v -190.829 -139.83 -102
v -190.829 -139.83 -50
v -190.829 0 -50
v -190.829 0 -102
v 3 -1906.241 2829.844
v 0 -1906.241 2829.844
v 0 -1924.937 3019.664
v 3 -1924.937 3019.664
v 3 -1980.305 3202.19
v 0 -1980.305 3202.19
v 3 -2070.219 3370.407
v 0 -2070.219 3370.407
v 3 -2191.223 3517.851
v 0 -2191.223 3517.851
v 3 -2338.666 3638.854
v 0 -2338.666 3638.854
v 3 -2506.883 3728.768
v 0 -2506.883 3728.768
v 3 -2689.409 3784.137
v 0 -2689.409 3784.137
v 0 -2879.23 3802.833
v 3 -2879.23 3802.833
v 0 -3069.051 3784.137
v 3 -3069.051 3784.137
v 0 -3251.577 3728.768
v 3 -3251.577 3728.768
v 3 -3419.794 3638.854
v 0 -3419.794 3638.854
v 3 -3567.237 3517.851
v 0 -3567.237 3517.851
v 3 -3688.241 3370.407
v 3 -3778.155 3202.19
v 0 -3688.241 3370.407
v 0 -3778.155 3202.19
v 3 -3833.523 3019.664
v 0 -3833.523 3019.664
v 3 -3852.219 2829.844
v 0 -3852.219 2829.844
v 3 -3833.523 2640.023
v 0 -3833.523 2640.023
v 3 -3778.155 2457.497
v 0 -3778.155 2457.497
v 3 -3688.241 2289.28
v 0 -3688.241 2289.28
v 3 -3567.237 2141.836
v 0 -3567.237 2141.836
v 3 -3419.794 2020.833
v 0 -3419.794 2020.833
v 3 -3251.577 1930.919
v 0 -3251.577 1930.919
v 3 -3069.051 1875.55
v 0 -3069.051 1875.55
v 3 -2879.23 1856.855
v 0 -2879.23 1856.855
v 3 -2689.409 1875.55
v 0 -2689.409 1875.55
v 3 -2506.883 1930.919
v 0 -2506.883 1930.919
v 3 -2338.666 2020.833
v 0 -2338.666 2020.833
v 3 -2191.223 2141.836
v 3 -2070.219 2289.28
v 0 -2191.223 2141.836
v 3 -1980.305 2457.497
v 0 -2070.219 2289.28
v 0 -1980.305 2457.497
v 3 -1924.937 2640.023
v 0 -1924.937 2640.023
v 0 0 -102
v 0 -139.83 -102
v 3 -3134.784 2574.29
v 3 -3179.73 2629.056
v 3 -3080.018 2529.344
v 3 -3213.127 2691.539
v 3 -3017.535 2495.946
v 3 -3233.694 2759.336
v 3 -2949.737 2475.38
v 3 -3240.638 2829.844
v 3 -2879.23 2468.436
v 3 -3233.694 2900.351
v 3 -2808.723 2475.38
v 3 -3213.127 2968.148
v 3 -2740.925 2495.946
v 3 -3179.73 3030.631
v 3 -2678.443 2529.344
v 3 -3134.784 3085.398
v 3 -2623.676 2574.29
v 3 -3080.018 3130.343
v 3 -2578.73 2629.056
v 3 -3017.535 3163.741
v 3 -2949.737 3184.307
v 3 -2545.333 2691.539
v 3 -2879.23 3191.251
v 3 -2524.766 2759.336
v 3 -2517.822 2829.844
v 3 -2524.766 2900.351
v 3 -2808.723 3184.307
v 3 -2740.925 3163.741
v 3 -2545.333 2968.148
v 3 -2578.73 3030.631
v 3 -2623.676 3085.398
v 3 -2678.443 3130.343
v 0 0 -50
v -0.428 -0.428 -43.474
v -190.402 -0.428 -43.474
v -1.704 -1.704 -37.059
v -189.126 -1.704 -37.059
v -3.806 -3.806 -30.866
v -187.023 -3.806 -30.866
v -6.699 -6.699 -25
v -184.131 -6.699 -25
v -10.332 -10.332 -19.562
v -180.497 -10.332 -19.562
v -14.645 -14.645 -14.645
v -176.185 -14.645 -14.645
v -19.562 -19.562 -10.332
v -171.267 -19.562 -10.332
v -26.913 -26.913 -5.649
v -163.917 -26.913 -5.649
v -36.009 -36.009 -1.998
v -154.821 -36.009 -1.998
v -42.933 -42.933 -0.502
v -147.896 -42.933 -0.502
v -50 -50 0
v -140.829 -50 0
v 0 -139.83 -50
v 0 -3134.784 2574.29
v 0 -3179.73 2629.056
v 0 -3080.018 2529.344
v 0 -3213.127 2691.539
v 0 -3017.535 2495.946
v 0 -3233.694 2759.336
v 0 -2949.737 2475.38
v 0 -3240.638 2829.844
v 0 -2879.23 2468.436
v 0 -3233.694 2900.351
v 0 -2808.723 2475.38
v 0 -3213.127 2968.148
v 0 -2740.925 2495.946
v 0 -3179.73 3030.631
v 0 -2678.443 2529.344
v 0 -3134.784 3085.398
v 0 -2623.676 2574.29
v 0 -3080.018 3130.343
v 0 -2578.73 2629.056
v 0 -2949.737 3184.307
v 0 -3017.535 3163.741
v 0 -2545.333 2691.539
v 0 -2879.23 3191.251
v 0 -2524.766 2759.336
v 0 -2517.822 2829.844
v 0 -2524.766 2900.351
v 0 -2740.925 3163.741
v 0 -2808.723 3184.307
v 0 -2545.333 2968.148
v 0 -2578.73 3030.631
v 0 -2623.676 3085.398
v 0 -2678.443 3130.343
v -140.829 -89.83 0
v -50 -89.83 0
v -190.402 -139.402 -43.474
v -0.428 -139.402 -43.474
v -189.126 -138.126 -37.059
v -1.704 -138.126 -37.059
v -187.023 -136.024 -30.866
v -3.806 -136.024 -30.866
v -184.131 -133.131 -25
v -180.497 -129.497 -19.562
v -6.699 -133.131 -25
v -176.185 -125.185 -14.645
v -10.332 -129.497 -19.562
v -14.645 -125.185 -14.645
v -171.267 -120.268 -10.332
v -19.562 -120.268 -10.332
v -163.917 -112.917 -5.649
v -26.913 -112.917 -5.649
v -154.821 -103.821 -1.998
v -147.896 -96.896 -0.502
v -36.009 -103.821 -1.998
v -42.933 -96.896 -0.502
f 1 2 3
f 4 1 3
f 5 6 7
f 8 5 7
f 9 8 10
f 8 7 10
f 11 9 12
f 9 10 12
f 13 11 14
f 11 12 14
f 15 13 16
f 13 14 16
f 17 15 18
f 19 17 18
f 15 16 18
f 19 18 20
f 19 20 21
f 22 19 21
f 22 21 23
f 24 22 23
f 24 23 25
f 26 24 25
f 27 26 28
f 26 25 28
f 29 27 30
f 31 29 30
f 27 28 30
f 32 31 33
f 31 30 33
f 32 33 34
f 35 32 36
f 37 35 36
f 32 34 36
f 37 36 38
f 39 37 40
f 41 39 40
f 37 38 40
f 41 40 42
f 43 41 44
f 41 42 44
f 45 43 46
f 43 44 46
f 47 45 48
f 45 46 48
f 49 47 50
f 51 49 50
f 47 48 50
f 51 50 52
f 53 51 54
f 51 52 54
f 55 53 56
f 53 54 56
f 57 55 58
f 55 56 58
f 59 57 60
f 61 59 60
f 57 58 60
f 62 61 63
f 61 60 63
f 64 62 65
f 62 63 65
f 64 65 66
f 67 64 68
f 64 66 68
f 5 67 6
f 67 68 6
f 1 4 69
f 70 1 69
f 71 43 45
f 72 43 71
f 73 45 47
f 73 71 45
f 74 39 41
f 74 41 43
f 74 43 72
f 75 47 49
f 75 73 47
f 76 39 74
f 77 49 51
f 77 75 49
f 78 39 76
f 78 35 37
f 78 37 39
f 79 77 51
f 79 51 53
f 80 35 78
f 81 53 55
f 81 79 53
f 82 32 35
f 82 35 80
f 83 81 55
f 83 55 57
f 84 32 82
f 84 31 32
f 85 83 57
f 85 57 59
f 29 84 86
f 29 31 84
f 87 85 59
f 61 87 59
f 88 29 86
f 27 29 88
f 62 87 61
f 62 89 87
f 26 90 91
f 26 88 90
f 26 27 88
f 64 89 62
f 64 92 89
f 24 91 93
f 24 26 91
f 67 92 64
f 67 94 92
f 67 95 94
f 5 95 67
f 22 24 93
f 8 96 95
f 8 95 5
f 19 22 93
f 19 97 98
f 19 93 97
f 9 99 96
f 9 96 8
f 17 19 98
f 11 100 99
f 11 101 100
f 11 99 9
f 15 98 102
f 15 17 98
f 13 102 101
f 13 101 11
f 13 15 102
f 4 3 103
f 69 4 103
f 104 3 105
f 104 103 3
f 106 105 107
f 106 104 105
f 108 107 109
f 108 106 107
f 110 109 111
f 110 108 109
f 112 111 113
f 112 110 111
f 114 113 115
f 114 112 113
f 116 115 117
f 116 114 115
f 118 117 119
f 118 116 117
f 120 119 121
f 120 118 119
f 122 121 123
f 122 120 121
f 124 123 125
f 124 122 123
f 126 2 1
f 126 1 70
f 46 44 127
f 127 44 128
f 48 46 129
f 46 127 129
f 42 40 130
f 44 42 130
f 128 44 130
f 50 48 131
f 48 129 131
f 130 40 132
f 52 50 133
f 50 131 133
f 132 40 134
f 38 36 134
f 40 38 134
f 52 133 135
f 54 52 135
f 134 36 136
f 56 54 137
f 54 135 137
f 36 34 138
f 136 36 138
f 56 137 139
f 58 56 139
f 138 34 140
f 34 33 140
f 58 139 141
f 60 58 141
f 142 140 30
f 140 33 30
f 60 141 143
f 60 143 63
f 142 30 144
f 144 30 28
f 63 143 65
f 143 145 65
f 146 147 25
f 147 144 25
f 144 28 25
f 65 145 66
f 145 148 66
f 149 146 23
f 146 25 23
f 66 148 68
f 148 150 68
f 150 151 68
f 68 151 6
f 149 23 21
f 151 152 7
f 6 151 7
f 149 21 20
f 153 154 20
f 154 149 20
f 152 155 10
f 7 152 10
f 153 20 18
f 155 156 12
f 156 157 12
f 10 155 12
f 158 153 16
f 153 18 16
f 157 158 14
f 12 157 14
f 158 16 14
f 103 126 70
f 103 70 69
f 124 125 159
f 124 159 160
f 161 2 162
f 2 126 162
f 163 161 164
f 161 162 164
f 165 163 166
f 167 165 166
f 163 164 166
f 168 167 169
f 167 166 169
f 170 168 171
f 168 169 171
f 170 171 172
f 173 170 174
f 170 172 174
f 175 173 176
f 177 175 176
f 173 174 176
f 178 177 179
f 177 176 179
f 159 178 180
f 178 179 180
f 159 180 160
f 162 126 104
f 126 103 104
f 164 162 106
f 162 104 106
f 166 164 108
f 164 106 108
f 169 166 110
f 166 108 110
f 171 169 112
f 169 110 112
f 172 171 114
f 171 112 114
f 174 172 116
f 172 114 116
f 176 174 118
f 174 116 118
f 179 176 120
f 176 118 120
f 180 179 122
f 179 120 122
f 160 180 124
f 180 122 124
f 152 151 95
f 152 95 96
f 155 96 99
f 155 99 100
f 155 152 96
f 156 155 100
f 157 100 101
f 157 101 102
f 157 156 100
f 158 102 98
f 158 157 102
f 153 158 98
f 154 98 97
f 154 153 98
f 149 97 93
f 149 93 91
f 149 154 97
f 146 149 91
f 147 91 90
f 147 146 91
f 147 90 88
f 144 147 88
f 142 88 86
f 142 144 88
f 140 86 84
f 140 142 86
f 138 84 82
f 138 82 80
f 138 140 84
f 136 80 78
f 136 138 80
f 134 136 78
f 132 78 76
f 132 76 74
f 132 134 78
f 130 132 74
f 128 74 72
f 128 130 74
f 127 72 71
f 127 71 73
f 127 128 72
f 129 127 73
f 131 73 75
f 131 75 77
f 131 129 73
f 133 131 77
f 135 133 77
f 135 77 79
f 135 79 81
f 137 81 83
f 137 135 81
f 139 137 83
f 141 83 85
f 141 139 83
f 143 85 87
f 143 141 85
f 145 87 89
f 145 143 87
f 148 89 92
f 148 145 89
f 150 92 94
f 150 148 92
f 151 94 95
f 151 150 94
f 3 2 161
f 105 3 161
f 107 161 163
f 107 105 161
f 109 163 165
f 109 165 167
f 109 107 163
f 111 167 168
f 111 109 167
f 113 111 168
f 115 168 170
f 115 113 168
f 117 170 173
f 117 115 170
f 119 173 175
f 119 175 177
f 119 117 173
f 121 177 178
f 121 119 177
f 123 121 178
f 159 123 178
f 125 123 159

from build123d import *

# Parameters (mm, degrees)
F0_W     = 190.829366
F0_H     = 139.829591
F1_DEPTH = 102
F2_R     = 50
F4_R     = 972.989
F4_R_2   = 361.40794
F5_DEPTH = 3


with BuildPart() as f1:
    # F0 (on Top) → F1 (new body)
    with BuildSketch(Plane.XY):
        with Locations((-95.414683, -69.914795)):
            Rectangle(F0_W, F0_H)
    extrude(amount=-F1_DEPTH)

    # F2
    f2_edges = [f1.edges().sort_by_distance(p)[0] for p in [
        (0, -69.914795, 0),
        (-95.414683, 0, 0),
        (-190.829366, -69.914795, 0),
        (-95.414683, -139.829591, 0),
    ]]
    fillet(f2_edges, radius=F2_R)


with BuildPart() as f5:
    # F4 (on face) → F5 (new body)
    with BuildSketch(Plane.YZ):
        with Locations((-2879.230022, 2829.843521)):
            Circle(F4_R)
        with Locations((-2879.230022, 2829.843521)):
            Circle(F4_R_2, mode=Mode.SUBTRACT)
    extrude(amount=F5_DEPTH)


solid = Compound([f1.part, f5.part])
